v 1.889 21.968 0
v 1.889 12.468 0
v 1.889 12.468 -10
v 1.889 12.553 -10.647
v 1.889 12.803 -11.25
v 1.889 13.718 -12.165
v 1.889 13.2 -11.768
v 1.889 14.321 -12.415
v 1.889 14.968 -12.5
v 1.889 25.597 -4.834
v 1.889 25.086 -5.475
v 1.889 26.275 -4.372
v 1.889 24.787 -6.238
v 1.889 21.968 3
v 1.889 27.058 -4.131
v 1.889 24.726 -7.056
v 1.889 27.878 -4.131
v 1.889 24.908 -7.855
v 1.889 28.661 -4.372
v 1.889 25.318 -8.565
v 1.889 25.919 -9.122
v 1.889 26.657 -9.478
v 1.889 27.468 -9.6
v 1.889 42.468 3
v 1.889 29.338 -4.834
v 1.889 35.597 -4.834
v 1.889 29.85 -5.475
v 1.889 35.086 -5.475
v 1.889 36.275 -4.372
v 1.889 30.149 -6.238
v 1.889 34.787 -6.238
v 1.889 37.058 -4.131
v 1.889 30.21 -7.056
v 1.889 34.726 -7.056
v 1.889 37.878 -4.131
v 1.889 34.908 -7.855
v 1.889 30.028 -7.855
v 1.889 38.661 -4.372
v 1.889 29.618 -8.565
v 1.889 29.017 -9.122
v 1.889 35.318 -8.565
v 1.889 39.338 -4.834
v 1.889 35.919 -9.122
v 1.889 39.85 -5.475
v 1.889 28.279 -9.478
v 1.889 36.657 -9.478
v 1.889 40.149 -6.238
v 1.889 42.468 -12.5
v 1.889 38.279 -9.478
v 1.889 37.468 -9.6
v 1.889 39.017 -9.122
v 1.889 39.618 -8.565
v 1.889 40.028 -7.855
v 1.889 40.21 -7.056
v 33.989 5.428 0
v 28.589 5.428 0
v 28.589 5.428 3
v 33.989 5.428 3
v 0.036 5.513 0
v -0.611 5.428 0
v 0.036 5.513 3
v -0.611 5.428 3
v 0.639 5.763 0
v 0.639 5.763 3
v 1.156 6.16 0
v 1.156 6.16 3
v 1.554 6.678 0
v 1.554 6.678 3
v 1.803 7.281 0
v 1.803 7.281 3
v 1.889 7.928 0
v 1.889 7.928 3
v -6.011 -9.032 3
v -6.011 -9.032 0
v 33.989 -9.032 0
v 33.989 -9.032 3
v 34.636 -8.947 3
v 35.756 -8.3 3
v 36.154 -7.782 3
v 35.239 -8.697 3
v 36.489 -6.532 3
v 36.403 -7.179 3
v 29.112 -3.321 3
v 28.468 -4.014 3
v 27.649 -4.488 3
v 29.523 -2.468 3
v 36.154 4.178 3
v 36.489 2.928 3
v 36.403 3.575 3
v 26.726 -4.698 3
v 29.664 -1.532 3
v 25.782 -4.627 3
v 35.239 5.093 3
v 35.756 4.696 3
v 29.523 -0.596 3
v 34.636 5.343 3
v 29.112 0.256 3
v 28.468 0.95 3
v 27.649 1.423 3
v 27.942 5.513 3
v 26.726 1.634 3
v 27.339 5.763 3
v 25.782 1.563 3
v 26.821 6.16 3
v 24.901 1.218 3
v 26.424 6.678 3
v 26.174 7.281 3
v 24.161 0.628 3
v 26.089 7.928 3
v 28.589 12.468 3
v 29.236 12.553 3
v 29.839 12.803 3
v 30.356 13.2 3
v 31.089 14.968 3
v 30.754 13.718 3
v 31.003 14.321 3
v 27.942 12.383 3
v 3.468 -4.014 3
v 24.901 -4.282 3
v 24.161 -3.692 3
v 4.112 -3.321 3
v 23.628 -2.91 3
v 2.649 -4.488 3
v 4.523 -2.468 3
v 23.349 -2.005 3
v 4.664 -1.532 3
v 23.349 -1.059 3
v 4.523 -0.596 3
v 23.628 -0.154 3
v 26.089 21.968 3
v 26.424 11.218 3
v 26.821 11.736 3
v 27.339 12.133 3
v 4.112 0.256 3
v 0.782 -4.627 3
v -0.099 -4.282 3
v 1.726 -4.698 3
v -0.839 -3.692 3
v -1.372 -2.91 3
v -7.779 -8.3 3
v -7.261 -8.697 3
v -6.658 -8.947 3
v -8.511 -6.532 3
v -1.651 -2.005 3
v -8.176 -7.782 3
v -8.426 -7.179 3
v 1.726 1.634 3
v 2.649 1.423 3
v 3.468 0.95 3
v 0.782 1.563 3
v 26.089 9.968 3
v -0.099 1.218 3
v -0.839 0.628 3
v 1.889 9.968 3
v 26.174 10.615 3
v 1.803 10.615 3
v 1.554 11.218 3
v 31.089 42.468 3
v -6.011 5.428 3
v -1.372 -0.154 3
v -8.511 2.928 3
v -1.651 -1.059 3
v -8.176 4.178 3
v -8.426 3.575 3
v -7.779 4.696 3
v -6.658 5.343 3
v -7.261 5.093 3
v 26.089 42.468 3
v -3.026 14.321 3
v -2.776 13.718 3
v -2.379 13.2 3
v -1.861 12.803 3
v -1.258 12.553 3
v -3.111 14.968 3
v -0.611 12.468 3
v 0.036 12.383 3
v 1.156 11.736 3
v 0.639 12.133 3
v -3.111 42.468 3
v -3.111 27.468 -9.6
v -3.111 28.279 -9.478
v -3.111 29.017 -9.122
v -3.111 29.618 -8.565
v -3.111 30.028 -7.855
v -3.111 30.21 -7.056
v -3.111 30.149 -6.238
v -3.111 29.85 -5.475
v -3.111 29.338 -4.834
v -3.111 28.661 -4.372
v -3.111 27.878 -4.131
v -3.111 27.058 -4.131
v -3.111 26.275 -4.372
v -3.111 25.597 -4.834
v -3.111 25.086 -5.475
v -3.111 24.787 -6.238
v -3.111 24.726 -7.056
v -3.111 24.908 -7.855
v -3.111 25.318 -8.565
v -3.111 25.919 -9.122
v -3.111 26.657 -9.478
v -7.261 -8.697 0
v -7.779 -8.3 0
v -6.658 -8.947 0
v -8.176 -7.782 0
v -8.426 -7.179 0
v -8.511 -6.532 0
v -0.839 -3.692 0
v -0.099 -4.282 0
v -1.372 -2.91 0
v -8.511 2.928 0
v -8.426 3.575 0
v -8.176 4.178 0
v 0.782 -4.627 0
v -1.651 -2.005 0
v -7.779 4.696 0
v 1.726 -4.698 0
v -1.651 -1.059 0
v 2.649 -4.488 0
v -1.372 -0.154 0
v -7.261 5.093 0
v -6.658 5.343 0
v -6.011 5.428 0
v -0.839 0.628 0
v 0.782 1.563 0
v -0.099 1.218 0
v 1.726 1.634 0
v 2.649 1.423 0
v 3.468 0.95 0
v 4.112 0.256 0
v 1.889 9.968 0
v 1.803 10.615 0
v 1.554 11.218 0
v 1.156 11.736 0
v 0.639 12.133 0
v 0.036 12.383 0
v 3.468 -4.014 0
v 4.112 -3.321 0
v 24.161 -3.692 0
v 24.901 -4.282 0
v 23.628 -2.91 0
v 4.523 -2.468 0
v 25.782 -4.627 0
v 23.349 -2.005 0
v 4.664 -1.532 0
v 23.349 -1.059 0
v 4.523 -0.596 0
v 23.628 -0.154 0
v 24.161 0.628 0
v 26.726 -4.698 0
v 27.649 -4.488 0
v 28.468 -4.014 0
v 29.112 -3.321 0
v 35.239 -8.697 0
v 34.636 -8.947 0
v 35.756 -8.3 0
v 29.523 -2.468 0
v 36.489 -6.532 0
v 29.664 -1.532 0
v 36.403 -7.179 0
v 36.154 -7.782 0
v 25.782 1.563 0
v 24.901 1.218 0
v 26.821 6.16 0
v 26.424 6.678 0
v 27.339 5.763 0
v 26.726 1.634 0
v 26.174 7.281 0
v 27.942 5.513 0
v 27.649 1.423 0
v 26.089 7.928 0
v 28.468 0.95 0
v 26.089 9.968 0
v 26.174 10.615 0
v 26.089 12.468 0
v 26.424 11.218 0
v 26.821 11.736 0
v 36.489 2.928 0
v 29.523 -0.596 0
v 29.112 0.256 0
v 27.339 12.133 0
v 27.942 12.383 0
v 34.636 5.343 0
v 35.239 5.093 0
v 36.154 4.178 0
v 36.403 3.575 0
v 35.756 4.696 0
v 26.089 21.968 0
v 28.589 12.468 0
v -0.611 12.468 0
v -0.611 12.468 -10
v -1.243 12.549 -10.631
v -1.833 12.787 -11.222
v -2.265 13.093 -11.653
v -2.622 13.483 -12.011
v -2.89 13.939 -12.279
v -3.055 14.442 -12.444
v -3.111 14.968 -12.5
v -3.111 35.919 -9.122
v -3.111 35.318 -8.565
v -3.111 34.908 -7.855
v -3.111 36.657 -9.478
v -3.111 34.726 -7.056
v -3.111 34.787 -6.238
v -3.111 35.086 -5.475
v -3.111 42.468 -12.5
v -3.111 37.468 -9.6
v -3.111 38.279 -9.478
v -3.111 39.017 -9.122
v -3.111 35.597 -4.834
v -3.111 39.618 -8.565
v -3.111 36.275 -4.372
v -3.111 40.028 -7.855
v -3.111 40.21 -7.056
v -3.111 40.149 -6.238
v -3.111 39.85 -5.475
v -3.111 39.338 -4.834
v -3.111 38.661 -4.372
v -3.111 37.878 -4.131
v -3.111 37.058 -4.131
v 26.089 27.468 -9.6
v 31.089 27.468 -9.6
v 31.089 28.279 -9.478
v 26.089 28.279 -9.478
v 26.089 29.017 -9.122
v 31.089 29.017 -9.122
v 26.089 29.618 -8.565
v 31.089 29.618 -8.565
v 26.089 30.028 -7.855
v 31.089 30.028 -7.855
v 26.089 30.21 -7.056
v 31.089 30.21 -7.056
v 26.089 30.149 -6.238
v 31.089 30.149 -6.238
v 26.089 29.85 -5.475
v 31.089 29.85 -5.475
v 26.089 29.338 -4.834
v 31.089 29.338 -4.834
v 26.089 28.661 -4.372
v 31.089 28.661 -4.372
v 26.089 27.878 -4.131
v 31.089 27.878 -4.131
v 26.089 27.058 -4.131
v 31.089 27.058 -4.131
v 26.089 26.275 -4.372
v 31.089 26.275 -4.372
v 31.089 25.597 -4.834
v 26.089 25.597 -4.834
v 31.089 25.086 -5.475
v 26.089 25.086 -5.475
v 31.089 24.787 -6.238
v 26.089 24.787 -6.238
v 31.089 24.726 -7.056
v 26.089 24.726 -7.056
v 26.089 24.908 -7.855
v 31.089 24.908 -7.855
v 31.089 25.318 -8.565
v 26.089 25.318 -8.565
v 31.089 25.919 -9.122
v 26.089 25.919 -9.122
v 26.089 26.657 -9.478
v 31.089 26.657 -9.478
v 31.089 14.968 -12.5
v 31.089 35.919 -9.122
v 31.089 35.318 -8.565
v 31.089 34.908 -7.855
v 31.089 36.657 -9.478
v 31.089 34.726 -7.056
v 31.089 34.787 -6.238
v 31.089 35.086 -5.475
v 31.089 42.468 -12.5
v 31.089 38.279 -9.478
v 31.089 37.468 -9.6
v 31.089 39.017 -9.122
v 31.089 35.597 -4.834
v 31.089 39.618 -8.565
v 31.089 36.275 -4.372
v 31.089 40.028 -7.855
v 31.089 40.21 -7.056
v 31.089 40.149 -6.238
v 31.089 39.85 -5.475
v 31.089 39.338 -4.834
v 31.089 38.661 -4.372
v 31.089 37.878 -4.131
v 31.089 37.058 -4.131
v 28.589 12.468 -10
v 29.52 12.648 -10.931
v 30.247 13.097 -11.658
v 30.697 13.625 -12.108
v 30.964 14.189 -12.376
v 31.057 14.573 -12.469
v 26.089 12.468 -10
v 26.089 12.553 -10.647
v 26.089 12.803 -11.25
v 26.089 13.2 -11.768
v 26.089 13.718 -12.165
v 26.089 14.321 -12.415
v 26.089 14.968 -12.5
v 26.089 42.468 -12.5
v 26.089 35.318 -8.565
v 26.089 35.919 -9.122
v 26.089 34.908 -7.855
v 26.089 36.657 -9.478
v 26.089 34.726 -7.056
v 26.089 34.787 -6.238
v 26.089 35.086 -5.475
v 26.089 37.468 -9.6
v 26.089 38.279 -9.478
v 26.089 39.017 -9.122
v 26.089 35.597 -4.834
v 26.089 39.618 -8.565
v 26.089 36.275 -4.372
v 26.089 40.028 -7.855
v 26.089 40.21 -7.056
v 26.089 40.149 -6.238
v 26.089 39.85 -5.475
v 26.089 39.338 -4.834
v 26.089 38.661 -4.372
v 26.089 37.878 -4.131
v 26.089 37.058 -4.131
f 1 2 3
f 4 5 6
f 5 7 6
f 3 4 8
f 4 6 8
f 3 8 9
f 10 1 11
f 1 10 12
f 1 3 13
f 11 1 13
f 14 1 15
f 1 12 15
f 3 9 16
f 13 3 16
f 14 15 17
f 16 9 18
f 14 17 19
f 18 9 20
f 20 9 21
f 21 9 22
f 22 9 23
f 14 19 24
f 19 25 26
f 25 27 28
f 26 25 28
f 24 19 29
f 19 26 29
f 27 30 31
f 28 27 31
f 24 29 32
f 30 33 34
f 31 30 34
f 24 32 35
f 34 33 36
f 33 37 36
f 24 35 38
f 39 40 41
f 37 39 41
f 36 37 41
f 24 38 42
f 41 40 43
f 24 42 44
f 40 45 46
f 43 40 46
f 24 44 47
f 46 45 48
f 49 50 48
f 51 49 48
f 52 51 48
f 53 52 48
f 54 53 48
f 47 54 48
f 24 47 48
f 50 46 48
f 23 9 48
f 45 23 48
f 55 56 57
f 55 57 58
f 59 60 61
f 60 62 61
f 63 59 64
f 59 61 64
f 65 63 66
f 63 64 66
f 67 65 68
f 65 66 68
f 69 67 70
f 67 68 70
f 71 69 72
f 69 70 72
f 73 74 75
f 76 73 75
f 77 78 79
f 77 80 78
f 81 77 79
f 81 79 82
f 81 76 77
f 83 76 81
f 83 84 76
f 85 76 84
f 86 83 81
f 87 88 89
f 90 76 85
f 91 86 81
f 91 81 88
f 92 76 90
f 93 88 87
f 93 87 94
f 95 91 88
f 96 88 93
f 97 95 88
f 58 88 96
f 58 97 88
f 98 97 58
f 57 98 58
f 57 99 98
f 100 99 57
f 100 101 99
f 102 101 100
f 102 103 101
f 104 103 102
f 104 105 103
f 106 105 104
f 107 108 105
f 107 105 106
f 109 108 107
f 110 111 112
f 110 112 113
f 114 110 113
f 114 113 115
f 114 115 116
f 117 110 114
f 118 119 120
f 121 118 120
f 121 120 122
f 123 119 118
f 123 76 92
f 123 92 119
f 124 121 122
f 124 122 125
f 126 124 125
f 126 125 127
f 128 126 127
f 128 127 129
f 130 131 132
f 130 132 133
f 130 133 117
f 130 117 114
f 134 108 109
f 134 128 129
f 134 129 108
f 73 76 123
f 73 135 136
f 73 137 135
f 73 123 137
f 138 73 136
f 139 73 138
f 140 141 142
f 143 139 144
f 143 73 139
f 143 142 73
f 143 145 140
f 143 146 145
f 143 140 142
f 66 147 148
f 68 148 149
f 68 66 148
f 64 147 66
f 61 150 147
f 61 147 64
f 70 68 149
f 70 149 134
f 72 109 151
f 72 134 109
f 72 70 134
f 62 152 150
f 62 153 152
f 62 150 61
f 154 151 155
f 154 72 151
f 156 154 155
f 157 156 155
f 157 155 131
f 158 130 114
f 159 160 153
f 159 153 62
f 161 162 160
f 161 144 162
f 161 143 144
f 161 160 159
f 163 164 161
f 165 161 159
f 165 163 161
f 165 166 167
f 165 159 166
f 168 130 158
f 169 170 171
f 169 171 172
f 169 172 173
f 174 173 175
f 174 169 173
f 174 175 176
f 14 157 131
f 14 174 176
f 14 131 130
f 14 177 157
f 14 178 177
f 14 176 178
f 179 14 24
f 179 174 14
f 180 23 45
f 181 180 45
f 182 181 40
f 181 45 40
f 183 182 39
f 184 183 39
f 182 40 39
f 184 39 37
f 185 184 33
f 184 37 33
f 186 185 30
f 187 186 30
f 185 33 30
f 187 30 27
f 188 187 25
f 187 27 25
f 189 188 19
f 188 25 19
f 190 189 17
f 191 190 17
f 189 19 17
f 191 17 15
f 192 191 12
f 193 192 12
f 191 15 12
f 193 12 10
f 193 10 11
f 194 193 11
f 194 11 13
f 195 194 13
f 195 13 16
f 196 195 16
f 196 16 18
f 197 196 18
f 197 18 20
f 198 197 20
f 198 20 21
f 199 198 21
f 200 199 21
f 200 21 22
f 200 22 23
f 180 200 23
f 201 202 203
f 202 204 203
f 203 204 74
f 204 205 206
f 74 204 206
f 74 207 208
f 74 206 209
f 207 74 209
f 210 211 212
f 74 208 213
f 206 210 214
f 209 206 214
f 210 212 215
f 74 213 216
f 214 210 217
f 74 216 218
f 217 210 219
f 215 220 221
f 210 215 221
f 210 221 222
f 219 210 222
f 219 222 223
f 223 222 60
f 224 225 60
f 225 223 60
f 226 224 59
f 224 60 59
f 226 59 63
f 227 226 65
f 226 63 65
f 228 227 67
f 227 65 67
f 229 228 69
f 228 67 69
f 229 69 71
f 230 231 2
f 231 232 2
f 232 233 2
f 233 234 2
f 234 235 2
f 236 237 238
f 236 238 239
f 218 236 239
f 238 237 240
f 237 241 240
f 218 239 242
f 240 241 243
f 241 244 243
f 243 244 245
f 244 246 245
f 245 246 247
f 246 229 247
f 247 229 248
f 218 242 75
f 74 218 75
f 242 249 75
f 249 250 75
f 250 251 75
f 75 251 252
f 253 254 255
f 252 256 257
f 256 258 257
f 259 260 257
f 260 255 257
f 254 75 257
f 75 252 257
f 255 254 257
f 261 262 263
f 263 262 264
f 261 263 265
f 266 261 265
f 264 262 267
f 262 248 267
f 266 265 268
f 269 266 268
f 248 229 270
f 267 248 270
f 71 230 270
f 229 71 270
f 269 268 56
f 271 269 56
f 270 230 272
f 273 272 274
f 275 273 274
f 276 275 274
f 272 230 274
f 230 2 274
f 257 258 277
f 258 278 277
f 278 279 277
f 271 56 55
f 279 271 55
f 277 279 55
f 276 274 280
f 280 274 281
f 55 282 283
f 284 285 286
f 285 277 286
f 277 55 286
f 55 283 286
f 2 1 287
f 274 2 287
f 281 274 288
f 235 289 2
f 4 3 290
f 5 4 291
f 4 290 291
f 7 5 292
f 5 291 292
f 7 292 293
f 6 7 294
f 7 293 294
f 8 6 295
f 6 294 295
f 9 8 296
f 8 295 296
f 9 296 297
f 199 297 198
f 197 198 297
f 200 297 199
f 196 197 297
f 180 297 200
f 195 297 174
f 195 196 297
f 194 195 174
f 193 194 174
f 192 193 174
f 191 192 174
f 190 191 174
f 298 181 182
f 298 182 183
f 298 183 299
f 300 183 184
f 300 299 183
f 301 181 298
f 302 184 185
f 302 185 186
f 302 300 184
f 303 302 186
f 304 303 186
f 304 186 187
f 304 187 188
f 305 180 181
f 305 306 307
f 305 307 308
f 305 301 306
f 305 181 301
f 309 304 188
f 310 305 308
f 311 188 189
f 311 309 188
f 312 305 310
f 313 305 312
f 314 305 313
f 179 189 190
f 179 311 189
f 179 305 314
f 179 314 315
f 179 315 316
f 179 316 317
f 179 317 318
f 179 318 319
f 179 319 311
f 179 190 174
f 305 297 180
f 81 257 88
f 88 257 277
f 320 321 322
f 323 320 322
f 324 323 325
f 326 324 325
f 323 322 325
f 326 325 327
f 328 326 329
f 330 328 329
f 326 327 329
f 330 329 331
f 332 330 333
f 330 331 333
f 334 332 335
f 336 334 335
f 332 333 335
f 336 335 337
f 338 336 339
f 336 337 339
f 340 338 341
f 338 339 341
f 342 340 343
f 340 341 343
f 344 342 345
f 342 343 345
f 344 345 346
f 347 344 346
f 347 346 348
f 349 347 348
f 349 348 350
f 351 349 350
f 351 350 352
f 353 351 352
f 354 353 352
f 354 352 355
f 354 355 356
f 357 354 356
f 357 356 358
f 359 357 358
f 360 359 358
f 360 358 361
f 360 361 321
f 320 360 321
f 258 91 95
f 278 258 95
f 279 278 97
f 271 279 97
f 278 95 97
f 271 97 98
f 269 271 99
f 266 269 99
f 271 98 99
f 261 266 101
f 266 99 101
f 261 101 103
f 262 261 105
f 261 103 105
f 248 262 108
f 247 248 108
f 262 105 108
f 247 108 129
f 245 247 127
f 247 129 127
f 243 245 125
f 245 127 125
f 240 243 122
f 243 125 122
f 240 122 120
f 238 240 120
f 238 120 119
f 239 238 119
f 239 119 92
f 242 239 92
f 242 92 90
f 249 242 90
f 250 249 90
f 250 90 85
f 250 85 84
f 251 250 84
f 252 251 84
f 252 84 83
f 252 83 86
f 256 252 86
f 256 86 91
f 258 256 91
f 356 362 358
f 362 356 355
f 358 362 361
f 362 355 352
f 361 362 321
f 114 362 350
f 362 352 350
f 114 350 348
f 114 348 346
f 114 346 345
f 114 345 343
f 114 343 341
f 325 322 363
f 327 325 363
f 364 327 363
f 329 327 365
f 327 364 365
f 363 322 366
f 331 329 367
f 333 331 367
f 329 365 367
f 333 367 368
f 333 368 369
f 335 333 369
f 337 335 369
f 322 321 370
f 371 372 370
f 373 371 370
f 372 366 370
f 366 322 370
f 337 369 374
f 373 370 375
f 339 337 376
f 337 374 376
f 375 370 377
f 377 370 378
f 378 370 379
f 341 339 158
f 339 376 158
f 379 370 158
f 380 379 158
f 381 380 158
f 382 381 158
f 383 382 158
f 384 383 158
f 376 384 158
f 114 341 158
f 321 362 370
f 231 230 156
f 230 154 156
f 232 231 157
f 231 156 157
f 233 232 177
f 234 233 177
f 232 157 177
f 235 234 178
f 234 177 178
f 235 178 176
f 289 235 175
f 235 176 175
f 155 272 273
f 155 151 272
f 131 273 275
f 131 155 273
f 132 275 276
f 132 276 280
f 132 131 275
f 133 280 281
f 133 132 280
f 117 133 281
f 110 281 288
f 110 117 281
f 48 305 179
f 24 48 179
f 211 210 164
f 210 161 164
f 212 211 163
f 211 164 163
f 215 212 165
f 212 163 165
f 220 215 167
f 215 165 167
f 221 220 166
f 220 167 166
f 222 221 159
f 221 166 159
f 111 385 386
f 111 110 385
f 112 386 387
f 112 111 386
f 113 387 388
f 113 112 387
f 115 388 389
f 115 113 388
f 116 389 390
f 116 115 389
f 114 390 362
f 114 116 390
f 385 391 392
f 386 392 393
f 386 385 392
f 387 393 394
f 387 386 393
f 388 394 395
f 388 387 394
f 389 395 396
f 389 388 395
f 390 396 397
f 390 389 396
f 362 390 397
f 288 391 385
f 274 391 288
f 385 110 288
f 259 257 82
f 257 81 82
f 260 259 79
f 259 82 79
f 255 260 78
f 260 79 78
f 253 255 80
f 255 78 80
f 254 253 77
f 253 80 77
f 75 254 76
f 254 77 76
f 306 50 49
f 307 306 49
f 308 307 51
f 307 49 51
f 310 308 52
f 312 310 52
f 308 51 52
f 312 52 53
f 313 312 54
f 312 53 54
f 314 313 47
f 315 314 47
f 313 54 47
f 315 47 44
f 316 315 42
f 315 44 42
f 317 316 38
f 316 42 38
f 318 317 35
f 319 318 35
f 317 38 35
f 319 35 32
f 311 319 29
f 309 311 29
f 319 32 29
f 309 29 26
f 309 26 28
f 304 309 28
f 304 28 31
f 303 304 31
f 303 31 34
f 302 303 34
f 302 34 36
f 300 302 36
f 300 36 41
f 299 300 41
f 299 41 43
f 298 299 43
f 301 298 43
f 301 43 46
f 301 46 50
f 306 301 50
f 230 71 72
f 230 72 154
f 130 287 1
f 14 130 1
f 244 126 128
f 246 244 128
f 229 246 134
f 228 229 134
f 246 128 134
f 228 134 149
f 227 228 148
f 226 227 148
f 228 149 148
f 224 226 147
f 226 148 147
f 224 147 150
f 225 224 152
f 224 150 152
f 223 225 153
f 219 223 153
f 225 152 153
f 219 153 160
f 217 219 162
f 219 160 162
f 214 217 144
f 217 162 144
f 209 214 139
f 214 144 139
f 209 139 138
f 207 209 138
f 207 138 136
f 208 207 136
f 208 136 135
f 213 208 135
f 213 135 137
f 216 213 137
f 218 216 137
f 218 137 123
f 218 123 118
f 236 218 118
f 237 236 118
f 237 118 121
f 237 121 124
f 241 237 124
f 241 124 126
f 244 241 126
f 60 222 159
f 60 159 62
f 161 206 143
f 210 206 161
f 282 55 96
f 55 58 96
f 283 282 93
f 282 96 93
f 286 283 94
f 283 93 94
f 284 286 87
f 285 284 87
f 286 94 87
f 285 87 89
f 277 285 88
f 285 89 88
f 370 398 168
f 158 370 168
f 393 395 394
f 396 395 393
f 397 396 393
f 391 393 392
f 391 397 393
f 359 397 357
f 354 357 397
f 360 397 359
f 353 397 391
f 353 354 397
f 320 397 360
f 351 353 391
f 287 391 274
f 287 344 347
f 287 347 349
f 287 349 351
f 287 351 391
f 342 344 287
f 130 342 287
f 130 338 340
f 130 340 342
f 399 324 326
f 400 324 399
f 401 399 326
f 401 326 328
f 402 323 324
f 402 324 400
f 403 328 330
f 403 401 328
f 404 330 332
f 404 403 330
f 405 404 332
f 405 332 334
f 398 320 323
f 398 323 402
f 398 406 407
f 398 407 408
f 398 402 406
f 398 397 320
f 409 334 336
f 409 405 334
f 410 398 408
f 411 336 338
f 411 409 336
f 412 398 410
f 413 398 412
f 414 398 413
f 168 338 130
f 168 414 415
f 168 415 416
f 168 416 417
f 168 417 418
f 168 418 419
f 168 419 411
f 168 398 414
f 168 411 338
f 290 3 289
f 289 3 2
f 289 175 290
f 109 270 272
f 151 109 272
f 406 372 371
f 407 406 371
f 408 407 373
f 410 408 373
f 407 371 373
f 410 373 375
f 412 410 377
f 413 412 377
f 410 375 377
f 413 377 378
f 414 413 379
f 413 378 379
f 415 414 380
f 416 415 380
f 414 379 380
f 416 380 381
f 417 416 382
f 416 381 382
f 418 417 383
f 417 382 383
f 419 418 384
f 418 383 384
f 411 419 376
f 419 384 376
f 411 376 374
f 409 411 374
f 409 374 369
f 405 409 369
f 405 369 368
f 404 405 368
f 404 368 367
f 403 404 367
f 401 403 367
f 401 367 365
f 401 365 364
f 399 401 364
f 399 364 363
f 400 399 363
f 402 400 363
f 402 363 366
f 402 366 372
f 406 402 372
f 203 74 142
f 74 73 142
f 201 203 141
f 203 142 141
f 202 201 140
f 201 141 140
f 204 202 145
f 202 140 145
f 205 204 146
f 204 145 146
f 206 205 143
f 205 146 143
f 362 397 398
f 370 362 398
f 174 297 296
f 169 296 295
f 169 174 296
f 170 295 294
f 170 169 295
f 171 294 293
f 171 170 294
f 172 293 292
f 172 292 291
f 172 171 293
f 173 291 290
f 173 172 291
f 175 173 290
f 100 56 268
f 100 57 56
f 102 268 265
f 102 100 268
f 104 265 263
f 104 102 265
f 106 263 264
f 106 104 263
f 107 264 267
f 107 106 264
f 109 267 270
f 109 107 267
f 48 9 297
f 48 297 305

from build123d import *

# Parameters (mm, degrees)
SKETCH1_W                   = 45
SKETCH1_H                   = 14.46
BOSS_EXTRUDE1_DEPTH         = 3
F_1_4_0_25_DIAMETER_HOLE1_D = 6.35
SKETCH5_W                   = 24.2
SKETCH5_H                   = 37.04
BOSS_EXTRUDE2_DEPTH         = 3
SKETCH6_W                   = 15.5
SKETCH6_H                   = 30
BOSS_EXTRUDE3_DEPTH         = 5
BOSS_EXTRUDE4_START         = -29.2
SKETCH7_W                   = 15.5
SKETCH7_H                   = 30
BOSS_EXTRUDE4_DEPTH         = 5
SKETCH12_W                  = 24.2
SKETCH12_H                  = 20.5
CUT_EXTRUDE1_DEPTH          = 3
M5_CLEARANCE_HOLE1_D        = 5.5
FILLET3_R                   = 2.5
FILLET4_R                   = 2.5


with BuildPart() as part:
    # Sketch1 → Boss-Extrude1 (new body)
    with BuildSketch(Plane.XY):
        with Locations((13.988651535, -1.802042724)):
            Rectangle(SKETCH1_W, SKETCH1_H)
    extrude(amount=BOSS_EXTRUDE1_DEPTH)

    # 1/4 (0.25) Diameter Hole1 (through all)
    with Locations(Plane(origin=(0, 0, 0), x_dir=(-1, 0, 0), z_dir=(0, 0, -1))):
        with Locations((-26.488651535, -1.532042724), (-1.488651535, -1.532042724)):
            Hole(F_1_4_0_25_DIAMETER_HOLE1_D / 2)

    # Sketch5 → Boss-Extrude2 (add)
    with BuildSketch(Plane(origin=(0, 0, 0), x_dir=(-1, 0, 0), z_dir=(0, 0, -1))):
        with Locations((-13.988651535, 23.947957276)):
            Rectangle(SKETCH5_W, SKETCH5_H)
    extrude(amount=-BOSS_EXTRUDE2_DEPTH)

    # Sketch6 → Boss-Extrude3 (add)
    with BuildSketch(Plane.ZY.offset(-1.888651535)):
        with Locations((-4.75, 27.467957276)):
            Rectangle(SKETCH6_W, SKETCH6_H)
    extrude(amount=BOSS_EXTRUDE3_DEPTH)

    # Sketch7 → Boss-Extrude4 (add)
    with BuildSketch(Plane.ZY.offset(3.111348465).offset(BOSS_EXTRUDE4_START)):
        with Locations((-4.75, 27.467957276)):
            Rectangle(SKETCH7_W, SKETCH7_H)
    extrude(amount=-BOSS_EXTRUDE4_DEPTH)

    # Sketch12 → Cut-Extrude1 (cut)
    with BuildSketch(Plane(origin=(0, 0, 0), x_dir=(-1, 0, 0), z_dir=(0, 0, -1))):
        with Locations((-13.988651535, 32.217957276)):
            Rectangle(SKETCH12_W, SKETCH12_H)
    extrude(amount=-CUT_EXTRUDE1_DEPTH, mode=Mode.SUBTRACT)

    # M5 Clearance Hole1 (through all)
    with Locations(Plane.ZY.offset(3.111348465)):
        with Locations((-6.85, 37.467957276), (-6.85, 27.467957276)):
            Hole(M5_CLEARANCE_HOLE1_D / 2)

    # Fillet3
    fillet3_edges = [part.edges().sort_by_distance(p)[0] for p in [
        (-8.511348465, 5.427957276, 1.5),
        (36.488651535, 5.427957276, 1.5),
        (36.488651535, -9.032042724, 1.5),
        (-8.511348465, -9.032042724, 1.5),
    ]]
    fillet(fillet3_edges, radius=FILLET3_R)

    # Fillet4
    fillet4_edges = [part.edges().sort_by_distance(p)[0] for p in [
        (1.888651535, 5.427957276, 1.5),
        (26.088651535, 5.427957276, 1.5),
        (26.088651535, 12.467957276, 1.5),
        (1.888651535, 12.467957276, 1.5),
        (31.088651535, 12.467957276, -4.75),
        (-3.111348465, 12.467957276, -4.75),
        (28.588651535, 12.467957276, -12.5),
        (-0.611348465, 12.467957276, -12.5),
    ]]
    fillet(fillet4_edges, radius=FILLET4_R - 0.0001)  # a hair under: the kernel refuses the full size


solid = part.part
